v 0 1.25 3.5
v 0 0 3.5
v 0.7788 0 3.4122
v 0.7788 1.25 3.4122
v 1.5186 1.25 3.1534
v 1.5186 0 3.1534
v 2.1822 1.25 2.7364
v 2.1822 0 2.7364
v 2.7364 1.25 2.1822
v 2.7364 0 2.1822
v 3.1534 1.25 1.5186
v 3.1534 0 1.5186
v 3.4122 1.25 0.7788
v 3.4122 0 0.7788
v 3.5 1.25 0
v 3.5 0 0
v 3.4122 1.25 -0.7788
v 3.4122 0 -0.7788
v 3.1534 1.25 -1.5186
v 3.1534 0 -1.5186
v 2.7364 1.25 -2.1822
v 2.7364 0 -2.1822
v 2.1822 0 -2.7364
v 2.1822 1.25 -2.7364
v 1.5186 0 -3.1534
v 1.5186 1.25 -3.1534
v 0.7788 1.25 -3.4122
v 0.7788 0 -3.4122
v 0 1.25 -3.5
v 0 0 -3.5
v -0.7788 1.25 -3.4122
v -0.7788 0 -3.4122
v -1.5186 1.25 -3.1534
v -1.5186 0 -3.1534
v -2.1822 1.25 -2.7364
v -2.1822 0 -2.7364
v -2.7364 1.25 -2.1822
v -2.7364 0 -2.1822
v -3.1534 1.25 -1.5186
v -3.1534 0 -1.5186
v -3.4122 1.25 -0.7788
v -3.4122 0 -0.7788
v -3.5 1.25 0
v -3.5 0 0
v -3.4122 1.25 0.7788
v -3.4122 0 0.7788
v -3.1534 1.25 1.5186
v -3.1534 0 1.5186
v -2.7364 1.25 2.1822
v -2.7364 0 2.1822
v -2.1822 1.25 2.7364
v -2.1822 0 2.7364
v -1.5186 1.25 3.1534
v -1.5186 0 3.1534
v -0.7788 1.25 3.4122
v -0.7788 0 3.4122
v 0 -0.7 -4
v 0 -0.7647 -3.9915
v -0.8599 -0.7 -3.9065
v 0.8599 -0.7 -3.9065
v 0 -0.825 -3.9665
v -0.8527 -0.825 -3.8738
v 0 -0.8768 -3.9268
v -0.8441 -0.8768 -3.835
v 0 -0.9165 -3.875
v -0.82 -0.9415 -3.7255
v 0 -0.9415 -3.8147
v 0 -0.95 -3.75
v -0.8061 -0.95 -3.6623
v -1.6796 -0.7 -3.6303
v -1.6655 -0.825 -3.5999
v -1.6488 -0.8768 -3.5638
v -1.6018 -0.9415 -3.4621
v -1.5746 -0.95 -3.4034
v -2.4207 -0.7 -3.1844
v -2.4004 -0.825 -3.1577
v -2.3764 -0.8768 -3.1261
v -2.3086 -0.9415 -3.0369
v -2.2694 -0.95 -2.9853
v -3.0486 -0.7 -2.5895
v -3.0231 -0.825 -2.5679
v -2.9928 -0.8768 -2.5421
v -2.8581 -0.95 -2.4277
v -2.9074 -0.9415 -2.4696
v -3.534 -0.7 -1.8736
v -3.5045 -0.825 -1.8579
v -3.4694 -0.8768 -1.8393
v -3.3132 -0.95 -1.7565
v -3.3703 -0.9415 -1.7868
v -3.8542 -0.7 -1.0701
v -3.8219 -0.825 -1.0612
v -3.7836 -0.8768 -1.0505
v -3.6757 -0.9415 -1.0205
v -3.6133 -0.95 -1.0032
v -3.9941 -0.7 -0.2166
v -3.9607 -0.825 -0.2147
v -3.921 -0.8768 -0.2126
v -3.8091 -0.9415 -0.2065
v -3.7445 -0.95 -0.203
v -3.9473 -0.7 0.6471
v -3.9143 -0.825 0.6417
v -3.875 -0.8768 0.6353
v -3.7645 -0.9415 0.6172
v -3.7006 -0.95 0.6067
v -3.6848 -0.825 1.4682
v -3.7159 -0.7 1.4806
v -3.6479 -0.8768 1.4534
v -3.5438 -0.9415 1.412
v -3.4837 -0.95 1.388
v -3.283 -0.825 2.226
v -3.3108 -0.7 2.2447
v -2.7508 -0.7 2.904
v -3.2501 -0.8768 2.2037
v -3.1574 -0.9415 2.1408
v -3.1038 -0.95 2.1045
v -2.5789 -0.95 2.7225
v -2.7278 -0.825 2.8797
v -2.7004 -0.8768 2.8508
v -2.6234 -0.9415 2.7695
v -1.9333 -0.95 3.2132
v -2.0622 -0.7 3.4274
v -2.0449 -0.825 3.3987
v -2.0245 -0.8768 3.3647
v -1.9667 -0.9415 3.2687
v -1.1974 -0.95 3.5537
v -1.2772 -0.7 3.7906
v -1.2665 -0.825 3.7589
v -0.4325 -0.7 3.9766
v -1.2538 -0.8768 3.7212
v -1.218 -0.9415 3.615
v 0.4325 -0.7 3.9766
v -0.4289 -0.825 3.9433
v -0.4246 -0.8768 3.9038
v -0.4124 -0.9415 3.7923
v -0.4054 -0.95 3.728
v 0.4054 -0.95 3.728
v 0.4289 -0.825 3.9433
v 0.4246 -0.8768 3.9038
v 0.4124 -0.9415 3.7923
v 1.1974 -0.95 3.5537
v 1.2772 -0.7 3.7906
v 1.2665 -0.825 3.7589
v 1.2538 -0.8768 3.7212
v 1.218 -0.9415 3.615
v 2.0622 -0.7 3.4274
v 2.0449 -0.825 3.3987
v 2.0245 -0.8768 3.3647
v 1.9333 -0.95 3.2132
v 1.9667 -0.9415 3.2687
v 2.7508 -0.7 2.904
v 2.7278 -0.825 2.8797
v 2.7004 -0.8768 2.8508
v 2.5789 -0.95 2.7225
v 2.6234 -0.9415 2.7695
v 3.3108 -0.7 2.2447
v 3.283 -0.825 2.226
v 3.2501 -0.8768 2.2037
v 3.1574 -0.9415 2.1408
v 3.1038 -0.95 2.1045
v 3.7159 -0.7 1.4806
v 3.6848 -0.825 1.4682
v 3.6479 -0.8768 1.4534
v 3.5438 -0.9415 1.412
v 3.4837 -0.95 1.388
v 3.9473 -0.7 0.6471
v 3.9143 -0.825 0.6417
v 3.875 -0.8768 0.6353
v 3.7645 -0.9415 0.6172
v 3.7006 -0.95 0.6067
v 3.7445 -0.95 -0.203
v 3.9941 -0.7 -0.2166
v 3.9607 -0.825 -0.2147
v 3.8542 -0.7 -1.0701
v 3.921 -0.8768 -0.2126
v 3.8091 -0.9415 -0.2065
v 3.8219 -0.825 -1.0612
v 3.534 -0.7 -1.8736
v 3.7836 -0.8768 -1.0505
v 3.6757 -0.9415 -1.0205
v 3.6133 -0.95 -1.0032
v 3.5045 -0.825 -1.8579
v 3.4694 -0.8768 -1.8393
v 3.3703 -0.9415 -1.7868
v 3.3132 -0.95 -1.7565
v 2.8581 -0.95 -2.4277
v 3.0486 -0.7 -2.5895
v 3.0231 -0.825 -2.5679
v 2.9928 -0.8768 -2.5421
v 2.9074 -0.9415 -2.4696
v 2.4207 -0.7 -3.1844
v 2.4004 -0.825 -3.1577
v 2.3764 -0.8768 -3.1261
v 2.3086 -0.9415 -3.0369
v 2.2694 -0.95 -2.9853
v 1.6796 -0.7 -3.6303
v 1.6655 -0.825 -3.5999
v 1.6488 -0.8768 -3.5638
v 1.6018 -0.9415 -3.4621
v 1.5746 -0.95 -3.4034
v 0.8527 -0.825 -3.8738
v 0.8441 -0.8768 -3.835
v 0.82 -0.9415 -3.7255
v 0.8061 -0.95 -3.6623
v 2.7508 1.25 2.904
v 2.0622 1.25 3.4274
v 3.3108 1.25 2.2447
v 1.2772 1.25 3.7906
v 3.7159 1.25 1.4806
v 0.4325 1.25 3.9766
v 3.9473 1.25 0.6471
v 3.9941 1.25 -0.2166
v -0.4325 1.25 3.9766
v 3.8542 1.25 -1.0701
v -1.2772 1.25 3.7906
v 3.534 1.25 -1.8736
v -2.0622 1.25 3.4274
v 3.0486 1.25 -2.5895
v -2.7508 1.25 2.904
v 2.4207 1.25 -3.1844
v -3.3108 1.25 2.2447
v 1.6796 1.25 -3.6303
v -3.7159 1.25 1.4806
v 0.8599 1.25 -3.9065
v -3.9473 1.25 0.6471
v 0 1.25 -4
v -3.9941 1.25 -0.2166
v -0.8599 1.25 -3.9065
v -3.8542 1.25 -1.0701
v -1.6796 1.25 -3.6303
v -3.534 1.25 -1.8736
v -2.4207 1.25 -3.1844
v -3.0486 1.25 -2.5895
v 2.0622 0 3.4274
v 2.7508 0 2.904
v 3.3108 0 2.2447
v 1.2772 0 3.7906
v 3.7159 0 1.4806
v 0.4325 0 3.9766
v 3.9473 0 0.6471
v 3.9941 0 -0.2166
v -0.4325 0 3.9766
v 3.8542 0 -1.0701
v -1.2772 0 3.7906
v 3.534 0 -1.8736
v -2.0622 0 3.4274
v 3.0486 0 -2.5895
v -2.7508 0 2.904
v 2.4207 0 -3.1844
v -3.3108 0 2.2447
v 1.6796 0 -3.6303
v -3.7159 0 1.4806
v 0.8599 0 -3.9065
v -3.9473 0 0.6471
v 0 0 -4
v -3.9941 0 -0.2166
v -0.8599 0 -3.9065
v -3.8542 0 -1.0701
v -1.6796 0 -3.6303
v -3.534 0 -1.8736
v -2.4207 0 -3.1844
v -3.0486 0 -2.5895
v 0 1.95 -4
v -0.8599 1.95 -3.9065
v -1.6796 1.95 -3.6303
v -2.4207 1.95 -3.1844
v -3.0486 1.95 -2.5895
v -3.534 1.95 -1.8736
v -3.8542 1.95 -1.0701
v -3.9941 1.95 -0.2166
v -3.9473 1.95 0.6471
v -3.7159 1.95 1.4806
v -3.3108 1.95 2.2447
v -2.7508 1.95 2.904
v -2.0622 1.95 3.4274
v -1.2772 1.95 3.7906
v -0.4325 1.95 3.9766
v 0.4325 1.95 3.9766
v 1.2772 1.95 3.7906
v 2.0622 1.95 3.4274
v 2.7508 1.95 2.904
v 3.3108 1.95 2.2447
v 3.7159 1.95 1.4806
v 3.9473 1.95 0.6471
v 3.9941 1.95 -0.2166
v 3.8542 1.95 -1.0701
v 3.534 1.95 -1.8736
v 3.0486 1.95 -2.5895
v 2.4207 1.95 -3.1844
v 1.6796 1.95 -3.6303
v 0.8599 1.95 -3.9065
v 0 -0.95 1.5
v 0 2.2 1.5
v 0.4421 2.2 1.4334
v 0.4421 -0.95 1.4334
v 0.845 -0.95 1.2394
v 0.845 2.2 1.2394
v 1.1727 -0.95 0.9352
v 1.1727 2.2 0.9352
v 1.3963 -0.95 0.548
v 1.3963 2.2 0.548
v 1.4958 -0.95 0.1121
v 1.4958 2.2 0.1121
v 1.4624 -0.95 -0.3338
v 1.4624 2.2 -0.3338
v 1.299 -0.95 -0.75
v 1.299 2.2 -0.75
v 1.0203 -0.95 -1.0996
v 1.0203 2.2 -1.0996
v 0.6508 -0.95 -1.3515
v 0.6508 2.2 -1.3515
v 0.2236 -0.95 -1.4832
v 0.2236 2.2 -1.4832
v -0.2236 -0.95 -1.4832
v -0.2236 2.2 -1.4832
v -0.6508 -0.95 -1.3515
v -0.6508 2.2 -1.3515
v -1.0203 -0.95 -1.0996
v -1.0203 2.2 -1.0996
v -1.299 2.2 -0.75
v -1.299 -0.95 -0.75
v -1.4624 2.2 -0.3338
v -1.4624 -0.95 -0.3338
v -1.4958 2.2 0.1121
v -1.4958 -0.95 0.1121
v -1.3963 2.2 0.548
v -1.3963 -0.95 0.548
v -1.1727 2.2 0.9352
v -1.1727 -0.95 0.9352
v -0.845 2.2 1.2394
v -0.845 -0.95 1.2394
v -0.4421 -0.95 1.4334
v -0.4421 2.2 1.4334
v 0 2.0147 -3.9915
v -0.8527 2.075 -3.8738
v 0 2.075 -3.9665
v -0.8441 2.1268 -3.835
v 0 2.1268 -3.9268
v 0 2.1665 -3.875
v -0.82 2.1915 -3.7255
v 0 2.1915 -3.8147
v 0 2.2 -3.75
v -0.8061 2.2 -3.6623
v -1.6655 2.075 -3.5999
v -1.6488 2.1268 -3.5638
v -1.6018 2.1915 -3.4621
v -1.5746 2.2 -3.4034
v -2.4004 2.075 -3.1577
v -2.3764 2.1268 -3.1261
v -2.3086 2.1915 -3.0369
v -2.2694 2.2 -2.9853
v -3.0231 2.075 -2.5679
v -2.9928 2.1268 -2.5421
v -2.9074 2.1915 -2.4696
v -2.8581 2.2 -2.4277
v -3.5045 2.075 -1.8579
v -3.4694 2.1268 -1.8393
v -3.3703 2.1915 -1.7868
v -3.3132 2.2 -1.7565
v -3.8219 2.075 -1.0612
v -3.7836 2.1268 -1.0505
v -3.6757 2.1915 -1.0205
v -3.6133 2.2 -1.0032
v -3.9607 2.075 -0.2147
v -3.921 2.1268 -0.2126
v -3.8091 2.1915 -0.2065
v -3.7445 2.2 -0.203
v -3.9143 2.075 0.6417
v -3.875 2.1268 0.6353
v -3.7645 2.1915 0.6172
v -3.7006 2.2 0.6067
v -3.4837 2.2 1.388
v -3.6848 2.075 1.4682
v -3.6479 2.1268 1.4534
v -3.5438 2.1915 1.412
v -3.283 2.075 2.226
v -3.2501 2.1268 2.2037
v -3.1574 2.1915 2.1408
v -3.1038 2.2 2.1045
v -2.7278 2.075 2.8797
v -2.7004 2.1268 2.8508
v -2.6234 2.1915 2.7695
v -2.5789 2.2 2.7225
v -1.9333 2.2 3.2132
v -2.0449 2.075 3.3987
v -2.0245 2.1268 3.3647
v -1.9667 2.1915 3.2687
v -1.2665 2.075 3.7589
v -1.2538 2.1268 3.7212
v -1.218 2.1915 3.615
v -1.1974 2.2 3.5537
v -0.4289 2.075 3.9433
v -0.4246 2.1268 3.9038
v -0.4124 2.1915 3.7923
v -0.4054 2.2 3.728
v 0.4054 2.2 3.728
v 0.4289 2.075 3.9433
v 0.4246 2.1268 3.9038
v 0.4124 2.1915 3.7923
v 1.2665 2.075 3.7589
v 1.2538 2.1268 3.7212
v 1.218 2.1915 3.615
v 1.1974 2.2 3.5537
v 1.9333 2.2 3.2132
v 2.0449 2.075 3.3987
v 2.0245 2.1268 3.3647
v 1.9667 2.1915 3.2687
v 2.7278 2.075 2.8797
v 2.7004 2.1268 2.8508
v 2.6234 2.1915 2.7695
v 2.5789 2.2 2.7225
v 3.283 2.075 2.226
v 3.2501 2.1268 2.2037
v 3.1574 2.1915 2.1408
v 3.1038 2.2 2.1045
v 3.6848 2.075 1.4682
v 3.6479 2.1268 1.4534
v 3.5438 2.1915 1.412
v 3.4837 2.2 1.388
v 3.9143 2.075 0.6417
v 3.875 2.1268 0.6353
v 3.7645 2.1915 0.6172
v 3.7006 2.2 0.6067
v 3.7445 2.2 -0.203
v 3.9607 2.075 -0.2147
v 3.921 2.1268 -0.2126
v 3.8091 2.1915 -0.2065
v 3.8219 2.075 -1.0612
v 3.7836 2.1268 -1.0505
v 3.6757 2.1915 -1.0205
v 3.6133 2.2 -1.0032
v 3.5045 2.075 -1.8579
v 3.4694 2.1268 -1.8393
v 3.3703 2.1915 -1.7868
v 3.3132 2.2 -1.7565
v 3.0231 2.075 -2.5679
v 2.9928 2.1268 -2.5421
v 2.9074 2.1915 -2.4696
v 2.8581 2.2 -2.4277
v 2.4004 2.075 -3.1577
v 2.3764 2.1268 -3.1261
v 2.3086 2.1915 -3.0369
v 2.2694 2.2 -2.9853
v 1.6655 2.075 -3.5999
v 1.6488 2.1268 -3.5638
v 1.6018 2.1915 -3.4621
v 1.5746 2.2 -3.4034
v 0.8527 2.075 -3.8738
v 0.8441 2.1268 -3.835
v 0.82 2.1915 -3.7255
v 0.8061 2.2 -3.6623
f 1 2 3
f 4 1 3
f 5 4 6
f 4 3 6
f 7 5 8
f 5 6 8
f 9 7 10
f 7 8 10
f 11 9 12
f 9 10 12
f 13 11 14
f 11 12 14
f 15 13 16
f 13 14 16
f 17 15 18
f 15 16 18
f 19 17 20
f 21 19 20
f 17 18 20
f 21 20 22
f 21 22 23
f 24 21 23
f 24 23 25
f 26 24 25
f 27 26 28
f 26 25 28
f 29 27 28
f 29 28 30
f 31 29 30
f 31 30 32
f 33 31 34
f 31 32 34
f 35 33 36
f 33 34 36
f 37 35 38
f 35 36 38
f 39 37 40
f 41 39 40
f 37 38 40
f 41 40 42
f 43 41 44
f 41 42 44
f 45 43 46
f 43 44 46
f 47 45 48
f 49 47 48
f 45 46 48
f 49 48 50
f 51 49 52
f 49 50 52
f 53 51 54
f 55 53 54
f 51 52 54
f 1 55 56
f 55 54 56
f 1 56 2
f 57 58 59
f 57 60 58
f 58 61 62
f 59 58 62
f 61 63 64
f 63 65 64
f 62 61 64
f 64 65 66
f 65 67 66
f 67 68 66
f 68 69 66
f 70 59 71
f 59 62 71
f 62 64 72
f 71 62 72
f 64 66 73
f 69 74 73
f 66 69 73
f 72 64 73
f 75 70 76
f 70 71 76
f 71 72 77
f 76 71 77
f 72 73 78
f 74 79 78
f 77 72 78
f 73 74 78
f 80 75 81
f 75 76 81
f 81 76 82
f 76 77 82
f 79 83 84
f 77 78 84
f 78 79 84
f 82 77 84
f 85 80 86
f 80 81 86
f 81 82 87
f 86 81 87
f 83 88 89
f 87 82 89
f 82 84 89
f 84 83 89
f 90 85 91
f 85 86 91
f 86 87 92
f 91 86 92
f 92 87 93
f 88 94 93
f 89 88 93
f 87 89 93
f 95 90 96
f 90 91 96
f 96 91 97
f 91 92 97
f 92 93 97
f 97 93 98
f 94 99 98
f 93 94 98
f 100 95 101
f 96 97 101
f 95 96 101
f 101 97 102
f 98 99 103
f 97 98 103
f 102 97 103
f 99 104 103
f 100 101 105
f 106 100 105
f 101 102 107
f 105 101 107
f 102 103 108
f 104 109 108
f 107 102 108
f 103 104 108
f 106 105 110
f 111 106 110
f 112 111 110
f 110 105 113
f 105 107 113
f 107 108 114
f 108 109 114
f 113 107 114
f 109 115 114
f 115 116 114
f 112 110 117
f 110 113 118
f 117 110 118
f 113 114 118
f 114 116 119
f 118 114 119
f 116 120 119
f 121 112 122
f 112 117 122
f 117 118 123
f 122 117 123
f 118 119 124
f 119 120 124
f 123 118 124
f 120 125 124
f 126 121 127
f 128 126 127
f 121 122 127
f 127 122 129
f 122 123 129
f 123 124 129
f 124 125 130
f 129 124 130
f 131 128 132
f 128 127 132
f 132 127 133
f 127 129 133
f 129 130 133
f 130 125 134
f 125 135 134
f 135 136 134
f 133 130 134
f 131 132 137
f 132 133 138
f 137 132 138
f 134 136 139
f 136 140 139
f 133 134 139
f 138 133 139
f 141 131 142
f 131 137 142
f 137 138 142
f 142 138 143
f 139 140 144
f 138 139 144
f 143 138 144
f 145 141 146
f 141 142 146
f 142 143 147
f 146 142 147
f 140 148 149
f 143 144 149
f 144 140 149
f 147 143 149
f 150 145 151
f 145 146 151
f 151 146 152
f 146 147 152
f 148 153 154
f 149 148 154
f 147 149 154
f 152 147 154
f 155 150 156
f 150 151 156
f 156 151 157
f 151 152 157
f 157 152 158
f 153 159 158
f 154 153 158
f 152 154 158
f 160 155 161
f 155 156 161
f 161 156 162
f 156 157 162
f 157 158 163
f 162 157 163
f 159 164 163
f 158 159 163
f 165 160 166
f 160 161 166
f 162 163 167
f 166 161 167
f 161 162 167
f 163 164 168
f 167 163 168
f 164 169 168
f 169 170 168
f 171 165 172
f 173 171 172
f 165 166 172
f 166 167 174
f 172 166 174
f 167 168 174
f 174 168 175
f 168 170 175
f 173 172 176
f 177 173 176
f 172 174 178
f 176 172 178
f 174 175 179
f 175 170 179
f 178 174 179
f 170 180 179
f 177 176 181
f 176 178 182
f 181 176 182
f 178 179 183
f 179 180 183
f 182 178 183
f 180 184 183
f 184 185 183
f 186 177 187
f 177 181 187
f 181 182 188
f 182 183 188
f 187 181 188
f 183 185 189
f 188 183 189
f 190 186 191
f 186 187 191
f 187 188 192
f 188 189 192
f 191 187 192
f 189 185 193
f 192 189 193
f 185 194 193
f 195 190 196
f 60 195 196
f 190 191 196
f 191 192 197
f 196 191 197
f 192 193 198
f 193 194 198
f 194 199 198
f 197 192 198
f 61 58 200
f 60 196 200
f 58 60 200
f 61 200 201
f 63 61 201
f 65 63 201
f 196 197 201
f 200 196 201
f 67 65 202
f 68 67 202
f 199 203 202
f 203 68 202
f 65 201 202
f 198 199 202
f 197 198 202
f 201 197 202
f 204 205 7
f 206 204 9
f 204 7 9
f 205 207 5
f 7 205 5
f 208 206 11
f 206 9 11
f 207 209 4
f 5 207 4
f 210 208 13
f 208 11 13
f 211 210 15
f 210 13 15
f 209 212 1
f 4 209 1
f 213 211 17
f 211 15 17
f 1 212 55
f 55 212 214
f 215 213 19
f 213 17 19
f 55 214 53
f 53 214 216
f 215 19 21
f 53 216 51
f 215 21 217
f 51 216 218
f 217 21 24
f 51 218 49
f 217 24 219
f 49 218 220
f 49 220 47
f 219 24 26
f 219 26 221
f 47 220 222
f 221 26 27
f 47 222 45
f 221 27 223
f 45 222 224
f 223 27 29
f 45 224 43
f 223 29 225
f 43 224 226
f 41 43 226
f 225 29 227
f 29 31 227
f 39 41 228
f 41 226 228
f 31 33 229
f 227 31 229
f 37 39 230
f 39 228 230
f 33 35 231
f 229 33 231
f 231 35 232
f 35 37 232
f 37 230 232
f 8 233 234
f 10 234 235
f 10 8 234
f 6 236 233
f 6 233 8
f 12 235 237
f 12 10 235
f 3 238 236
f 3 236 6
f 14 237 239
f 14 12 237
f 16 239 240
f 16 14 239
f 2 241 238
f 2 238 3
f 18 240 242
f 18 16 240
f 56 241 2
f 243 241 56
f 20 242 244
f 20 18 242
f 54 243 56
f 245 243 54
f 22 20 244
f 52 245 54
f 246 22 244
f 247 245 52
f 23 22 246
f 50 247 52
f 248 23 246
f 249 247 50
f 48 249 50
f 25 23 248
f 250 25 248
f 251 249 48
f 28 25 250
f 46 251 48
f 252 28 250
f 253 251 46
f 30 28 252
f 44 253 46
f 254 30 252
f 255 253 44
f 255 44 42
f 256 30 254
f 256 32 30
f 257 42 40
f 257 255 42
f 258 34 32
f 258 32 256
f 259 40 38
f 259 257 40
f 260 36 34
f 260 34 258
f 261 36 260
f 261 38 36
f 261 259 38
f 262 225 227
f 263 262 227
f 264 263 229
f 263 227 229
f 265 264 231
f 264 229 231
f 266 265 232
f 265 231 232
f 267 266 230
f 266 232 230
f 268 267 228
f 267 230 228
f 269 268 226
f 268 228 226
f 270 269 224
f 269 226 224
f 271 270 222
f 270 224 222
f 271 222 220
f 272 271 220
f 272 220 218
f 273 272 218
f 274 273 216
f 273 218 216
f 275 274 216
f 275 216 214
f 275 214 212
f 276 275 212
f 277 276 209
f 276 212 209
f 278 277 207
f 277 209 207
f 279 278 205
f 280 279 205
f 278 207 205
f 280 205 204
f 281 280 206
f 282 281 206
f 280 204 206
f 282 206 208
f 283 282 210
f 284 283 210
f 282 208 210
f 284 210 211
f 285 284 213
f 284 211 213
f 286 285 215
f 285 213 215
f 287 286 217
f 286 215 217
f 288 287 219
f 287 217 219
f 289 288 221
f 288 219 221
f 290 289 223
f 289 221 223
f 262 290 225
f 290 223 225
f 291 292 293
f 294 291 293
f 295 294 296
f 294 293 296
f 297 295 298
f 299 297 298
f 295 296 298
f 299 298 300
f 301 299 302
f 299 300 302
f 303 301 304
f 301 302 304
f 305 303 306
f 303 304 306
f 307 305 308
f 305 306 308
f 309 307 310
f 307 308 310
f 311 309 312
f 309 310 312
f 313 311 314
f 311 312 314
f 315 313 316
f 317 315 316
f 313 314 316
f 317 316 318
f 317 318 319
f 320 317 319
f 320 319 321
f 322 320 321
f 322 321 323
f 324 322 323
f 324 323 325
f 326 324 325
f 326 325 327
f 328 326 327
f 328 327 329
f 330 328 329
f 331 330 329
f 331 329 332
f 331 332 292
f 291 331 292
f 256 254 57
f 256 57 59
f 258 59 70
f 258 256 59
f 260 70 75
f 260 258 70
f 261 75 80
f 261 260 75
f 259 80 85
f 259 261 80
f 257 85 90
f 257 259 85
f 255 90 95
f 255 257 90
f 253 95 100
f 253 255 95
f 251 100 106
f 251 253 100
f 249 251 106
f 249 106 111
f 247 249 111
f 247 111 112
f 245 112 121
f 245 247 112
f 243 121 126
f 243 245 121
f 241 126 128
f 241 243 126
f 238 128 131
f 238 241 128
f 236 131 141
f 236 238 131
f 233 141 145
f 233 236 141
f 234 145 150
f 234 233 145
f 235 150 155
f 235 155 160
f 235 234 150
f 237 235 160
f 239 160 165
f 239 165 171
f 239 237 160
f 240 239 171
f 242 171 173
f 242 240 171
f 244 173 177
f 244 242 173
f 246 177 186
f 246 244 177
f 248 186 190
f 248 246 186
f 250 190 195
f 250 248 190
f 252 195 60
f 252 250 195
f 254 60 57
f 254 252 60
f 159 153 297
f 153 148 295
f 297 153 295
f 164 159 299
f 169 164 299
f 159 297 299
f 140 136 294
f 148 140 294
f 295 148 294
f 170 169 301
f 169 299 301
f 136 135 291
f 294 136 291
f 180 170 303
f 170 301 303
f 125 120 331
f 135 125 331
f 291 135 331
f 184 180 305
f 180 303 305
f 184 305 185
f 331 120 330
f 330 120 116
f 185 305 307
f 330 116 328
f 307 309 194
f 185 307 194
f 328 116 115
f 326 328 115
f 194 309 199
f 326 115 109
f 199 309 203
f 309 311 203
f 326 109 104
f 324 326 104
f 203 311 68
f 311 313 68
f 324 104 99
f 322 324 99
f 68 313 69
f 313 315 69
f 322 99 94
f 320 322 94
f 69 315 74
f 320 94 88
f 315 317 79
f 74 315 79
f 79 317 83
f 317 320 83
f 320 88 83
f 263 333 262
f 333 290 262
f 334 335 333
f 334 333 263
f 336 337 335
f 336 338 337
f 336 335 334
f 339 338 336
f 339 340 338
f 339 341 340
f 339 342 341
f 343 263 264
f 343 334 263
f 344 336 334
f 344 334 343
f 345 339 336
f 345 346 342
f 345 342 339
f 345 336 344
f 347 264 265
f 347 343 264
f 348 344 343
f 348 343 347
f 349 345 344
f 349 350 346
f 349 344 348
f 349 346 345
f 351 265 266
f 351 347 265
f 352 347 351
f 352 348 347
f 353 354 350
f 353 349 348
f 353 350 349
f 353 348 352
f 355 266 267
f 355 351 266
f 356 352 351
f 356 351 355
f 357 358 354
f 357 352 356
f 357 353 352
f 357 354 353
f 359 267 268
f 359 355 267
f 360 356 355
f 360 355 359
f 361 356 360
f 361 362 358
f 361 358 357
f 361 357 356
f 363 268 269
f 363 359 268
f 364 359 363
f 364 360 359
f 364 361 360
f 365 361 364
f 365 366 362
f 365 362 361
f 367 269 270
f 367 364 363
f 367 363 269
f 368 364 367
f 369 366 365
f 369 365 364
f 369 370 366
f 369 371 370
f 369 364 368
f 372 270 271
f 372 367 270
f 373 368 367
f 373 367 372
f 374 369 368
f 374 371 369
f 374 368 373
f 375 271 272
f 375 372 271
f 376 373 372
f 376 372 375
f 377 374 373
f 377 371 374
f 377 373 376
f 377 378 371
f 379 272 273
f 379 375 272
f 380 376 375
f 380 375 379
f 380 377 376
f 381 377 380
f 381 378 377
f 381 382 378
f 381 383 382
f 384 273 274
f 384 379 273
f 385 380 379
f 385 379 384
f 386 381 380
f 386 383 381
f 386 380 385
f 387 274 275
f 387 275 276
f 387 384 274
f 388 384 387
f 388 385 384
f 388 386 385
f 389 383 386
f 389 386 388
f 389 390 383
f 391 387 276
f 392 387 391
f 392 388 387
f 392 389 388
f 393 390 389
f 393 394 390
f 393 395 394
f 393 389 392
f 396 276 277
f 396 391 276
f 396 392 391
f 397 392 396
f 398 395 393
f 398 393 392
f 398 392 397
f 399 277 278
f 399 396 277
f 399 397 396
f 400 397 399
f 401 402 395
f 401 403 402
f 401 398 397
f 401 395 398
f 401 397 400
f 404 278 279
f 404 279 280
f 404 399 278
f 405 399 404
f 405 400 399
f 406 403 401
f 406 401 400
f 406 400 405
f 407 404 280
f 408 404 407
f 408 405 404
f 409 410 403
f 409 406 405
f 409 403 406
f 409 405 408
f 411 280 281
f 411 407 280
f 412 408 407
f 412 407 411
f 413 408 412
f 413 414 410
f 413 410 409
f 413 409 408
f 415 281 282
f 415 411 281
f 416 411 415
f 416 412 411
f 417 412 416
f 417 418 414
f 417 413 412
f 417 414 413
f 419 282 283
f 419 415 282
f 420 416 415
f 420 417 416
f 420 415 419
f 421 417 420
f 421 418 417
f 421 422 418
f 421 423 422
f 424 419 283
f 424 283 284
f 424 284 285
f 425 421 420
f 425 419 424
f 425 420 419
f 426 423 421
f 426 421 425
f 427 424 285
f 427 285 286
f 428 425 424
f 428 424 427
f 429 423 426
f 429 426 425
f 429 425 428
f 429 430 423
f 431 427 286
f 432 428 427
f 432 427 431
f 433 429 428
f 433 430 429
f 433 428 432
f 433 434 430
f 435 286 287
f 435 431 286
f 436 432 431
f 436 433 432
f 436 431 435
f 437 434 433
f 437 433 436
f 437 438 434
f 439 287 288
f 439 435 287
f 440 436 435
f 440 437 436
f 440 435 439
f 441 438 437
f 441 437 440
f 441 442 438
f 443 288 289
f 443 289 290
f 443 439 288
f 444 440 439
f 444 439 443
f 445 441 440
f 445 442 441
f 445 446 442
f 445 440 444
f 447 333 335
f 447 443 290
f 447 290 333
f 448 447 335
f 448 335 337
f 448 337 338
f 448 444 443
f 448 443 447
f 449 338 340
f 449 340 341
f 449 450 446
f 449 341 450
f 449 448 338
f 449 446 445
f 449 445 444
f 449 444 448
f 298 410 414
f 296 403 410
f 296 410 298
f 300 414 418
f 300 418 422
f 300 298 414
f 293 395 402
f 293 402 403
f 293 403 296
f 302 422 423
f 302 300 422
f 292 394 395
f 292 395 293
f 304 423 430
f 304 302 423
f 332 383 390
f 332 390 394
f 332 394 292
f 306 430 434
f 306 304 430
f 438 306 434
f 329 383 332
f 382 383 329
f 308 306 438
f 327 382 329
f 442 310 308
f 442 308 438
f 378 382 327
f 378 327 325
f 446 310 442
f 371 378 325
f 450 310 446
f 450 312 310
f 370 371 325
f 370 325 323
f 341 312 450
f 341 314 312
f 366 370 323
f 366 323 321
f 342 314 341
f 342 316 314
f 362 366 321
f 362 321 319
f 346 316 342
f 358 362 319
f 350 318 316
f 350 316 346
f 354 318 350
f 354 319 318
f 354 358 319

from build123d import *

# Parameters (mm, degrees)
CROQUIS_BASE_R           = 3.5
SALIENTE_EXTRUIR3_DEPTH  = 1.25
CROQUIS_CAP_R            = 4
SALIENTE_EXTRUIR4_DEPTH  = 0.95
REDONDEO1_R              = 0.25
REDONDEO1_OF_SIMETR_A1_R = 0.25
CROQUIS_BARRENO_R        = 1.5
CORTAR_EXTRUIR1_DEPTH    = 7.474758683


with BuildPart() as part:
    # Croquis base → Saliente-Extruir3 (new body)
    with BuildSketch(Plane(origin=(0, 0, 0), x_dir=(1, 0, 0), z_dir=(0, 1, 0))):
        with Locations(Location((0, 0, 0), (0, 0, 270))):
            Circle(CROQUIS_BASE_R)
    extrude(amount=SALIENTE_EXTRUIR3_DEPTH)

    # Croquis cap → Saliente-Extruir4 (add)
    with BuildSketch(Plane(origin=(0, 1.25, 0), x_dir=(1, 0, 0), z_dir=(0, 1, 0))):
        with Locations(Location((0, 0, 0), (0, 0, 90))):
            Circle(CROQUIS_CAP_R)
    saliente_extruir4 = extrude(amount=SALIENTE_EXTRUIR4_DEPTH)

    # Redondeo1
    redondeo1_edges = [part.edges().sort_by_distance(p)[0] for p in [
        (0, 2.2, 4),
    ]]
    fillet(redondeo1_edges, radius=REDONDEO1_R)

    # Simetría1: Saliente-Extruir4 across plane
    add(saliente_extruir4.mirror(Plane.ZX.offset(0.625)))

    # Redondeo1 of Simetría1
    redondeo1_of_simetr_a1_edges = [part.edges().sort_by_distance(p)[0] for p in [
        (0, -0.95, 4),
    ]]
    fillet(redondeo1_of_simetr_a1_edges, radius=REDONDEO1_OF_SIMETR_A1_R)

    # Croquis barreno → Cortar-Extruir1 (cut, through all)
    with BuildSketch(Plane(origin=(0, 2.2, 0), x_dir=(1, 0, 0), z_dir=(0, 1, 0))):
        with Locations(Location((0, 0, 0), (0, 0, 270))):
            Circle(CROQUIS_BARRENO_R)
    extrude(amount=-CORTAR_EXTRUIR1_DEPTH, mode=Mode.SUBTRACT)


solid = part.part
